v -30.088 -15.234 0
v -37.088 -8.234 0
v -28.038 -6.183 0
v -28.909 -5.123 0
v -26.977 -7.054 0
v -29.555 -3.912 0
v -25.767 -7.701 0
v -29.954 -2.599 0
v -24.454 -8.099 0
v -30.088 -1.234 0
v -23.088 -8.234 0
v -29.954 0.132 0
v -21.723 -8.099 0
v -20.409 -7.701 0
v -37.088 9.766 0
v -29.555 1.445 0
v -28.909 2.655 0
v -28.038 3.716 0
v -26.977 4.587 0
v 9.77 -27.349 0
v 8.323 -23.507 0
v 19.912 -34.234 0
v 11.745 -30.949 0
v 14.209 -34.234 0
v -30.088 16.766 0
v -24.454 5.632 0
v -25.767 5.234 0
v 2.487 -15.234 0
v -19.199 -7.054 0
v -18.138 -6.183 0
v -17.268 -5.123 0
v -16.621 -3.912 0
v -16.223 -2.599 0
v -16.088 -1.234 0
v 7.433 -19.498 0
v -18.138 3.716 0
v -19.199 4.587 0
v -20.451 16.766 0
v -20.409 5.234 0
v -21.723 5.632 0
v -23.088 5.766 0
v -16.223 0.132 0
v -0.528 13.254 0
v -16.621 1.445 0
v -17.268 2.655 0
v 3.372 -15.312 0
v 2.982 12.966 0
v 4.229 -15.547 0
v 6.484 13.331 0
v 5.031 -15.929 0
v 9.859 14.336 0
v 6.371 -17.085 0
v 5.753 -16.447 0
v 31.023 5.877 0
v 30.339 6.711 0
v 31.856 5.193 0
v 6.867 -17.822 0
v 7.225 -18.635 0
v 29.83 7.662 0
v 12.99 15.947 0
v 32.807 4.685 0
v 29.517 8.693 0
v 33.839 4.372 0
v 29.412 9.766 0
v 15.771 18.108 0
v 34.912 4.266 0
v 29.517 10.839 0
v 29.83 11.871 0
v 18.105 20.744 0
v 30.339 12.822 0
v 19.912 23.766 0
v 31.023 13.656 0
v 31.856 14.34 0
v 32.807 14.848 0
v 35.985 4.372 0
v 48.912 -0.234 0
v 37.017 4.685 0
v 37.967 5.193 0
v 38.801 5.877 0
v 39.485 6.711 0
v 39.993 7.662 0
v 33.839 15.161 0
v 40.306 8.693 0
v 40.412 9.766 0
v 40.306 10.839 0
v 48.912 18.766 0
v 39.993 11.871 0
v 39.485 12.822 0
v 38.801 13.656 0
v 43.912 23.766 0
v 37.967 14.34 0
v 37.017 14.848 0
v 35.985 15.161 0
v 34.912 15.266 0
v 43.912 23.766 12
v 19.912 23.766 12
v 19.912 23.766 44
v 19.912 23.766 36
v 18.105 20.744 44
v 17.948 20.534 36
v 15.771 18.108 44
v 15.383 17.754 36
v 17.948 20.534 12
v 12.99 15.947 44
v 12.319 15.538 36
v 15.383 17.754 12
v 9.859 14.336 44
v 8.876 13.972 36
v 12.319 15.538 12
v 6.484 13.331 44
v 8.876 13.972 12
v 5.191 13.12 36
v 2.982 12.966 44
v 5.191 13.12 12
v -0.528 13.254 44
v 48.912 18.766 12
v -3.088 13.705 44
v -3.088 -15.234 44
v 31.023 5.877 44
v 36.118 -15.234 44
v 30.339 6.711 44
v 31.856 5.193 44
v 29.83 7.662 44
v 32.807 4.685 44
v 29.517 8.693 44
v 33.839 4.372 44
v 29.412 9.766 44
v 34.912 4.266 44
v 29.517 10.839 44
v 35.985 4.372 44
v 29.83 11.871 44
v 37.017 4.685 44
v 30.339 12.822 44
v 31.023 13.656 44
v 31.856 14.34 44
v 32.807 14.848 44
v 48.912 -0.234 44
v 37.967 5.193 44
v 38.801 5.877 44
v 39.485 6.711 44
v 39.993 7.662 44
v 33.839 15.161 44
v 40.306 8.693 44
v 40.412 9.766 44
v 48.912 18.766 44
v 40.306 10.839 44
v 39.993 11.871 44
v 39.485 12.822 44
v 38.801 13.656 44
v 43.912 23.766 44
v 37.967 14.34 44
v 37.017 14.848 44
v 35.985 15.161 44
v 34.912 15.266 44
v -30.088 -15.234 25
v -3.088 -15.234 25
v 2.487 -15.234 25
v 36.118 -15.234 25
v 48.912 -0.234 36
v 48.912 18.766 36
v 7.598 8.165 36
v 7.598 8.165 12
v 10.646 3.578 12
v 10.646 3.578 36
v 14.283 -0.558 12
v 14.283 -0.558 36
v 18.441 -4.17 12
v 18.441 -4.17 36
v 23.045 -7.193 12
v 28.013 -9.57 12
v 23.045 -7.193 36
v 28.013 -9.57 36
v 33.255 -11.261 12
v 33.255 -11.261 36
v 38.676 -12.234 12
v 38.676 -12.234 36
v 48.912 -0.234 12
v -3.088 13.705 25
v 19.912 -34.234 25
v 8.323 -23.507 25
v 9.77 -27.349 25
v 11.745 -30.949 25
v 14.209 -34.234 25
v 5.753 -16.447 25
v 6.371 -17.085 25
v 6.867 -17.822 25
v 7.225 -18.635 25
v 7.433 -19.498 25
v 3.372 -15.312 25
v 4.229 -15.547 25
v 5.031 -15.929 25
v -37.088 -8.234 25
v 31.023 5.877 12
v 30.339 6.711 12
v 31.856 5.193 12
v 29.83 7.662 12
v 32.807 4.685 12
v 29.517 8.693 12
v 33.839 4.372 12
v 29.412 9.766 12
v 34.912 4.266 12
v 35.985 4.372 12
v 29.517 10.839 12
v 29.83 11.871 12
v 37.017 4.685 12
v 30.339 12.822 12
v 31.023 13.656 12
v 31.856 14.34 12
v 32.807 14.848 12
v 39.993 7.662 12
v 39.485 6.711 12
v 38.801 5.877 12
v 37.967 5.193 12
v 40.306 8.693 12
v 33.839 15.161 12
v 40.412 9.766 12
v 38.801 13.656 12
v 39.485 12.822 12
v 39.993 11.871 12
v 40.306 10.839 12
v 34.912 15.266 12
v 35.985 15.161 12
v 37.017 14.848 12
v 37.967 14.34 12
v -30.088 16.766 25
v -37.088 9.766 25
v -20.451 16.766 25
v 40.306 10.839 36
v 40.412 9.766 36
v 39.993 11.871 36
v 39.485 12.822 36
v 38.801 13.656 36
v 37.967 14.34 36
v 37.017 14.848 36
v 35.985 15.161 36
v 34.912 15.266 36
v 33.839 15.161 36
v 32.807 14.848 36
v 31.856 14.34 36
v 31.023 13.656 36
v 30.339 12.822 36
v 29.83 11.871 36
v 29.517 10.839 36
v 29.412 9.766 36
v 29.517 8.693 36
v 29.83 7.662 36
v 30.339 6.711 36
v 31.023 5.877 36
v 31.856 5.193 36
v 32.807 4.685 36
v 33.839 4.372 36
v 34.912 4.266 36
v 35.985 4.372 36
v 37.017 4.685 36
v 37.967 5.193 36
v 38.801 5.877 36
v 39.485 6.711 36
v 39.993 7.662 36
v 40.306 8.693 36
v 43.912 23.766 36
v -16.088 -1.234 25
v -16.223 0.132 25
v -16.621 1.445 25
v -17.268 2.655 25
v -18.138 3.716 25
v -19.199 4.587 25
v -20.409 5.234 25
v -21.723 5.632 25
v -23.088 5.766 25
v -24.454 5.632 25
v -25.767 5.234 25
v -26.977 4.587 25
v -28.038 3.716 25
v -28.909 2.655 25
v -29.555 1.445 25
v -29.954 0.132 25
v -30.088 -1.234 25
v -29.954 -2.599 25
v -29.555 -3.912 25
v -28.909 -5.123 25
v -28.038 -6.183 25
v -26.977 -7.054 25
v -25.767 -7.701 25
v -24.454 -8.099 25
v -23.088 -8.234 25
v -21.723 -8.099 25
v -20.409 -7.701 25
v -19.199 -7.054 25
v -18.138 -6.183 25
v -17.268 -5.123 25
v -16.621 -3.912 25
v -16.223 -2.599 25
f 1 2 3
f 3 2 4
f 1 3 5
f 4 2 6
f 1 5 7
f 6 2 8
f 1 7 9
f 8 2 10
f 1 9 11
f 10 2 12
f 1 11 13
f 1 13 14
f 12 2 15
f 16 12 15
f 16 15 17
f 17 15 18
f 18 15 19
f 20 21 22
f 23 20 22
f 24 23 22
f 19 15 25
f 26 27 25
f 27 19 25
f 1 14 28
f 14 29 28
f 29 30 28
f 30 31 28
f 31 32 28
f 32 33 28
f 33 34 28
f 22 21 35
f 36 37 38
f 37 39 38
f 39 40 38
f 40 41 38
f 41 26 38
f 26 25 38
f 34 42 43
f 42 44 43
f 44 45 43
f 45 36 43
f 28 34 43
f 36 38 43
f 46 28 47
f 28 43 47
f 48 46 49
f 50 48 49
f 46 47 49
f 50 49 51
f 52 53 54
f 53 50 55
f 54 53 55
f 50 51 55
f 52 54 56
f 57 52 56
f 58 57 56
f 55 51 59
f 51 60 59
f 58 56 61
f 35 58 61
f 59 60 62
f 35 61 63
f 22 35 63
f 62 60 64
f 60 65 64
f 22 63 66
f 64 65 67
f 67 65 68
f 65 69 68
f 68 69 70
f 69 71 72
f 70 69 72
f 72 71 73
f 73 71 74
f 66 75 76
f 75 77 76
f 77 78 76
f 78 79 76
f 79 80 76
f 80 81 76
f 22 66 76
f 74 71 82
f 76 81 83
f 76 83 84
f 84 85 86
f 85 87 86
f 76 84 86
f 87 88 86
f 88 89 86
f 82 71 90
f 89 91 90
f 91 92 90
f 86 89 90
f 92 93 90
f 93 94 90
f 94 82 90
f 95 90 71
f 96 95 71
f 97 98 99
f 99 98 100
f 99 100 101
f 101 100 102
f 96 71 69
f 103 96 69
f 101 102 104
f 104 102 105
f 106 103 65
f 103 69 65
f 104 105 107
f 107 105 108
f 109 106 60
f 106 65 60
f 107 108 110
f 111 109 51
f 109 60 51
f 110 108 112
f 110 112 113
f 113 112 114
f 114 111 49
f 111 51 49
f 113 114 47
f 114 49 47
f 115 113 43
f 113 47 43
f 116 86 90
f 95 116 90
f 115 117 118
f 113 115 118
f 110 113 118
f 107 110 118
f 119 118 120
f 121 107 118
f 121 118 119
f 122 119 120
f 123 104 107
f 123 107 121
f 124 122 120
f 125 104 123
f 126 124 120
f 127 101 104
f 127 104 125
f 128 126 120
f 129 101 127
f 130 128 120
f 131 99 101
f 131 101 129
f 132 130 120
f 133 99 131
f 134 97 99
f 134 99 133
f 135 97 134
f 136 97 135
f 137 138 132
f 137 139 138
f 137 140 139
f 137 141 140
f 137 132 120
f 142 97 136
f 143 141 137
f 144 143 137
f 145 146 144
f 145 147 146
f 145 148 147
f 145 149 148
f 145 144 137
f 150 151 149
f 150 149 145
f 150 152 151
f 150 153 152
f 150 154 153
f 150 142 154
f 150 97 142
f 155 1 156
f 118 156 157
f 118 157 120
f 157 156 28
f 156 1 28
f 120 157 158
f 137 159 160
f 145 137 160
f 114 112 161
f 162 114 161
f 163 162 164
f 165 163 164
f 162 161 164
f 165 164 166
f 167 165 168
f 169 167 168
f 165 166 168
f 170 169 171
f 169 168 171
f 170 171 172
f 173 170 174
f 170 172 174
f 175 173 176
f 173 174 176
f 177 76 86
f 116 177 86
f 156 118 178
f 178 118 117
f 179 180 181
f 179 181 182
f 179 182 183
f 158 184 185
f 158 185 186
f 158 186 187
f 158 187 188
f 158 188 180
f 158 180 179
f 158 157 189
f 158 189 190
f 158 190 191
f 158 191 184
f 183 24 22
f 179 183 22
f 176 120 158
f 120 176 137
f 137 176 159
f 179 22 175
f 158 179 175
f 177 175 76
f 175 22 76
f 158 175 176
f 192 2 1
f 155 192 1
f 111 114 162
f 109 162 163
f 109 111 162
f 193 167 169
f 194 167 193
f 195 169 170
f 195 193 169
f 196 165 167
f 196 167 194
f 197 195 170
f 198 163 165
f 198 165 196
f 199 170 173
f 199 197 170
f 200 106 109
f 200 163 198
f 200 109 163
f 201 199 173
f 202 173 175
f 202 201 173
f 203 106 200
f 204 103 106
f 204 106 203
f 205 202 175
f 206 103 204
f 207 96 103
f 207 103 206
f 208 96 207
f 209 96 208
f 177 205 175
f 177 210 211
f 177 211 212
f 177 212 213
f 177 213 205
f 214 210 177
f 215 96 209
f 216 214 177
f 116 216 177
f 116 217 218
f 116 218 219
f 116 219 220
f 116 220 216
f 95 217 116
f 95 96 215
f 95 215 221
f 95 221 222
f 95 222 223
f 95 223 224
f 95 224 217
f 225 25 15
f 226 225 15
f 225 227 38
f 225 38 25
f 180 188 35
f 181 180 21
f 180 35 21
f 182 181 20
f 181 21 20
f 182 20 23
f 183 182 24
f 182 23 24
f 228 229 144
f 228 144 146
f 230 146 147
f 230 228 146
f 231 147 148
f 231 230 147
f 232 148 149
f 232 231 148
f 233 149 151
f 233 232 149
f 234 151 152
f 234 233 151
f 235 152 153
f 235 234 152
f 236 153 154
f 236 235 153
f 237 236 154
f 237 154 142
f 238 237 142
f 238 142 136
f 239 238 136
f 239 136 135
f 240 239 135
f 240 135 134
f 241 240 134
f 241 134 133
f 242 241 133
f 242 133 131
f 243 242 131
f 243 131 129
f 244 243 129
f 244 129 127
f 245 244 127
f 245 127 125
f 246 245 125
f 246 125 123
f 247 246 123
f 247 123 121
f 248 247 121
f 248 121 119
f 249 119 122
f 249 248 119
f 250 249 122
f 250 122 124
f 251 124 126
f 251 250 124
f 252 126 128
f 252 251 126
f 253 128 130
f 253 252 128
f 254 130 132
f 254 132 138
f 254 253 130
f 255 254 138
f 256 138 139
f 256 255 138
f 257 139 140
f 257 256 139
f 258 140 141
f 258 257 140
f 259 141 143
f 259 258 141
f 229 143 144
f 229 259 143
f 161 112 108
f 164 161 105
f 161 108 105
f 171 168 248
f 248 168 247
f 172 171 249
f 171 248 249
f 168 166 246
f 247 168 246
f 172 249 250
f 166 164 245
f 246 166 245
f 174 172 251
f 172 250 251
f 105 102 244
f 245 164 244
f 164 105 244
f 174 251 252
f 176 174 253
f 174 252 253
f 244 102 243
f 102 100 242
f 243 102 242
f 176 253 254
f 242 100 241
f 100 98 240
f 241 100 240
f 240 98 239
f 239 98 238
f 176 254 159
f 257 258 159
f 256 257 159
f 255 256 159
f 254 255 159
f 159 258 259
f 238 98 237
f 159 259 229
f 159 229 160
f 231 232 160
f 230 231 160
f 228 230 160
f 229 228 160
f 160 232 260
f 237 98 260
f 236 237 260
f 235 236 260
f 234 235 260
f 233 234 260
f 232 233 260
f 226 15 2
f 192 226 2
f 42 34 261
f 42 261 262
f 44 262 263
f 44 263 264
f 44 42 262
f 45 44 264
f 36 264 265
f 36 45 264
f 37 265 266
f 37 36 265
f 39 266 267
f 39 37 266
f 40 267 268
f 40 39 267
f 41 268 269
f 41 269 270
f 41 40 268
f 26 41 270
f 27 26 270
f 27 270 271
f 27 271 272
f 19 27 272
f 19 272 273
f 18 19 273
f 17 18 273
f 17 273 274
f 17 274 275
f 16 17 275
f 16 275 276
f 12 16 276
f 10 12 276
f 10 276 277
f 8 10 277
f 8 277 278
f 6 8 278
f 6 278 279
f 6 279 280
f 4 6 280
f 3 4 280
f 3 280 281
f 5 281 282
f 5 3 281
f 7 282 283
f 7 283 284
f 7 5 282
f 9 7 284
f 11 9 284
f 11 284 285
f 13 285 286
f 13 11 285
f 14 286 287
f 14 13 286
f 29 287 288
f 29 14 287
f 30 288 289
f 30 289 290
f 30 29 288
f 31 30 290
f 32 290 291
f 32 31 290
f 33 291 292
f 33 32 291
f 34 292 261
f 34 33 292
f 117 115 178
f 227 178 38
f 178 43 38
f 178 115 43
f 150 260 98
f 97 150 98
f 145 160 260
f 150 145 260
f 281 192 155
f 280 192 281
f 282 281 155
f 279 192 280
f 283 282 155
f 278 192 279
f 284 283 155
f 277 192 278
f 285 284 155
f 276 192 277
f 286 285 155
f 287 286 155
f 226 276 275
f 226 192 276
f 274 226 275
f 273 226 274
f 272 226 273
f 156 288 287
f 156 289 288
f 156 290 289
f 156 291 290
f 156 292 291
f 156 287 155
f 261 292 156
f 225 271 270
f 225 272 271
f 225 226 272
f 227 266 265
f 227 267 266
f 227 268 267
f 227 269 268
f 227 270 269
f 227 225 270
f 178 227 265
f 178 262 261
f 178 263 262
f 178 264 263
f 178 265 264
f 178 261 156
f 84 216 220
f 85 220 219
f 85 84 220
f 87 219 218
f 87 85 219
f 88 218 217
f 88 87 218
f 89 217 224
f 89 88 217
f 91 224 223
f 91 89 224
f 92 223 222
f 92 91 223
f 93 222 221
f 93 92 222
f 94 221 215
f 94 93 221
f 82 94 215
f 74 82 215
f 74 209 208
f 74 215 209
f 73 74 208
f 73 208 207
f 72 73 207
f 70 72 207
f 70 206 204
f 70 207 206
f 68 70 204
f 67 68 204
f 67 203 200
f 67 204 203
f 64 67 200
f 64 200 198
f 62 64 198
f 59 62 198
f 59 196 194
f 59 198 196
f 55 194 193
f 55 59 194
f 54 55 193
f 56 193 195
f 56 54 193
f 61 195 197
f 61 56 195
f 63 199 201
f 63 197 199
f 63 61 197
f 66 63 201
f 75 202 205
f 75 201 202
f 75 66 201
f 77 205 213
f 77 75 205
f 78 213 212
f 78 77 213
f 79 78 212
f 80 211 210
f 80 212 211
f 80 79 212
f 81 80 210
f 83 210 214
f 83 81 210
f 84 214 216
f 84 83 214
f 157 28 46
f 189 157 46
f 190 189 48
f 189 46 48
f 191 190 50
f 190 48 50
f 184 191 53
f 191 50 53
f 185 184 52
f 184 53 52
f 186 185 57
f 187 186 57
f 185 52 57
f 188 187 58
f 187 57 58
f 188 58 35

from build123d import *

# Parameters (mm, degrees)
F0_R     = 7
F0_R_2   = 5.5
F1_DEPTH = 44
F2_R     = 7
F3_DEPTH = 19
F5_R     = 41
F6_DEPTH = 24
F8_DEPTH = 19


with BuildPart() as f1:
    # F0 (on Top) → F1 (new body)
    with BuildSketch(Plane.XY):
        with BuildLine():
            Line((-20.4506443609, 16.7664520695), (-30.0882231277, 16.7664520695))
            Line((-30.0882231277, 16.7664520695), (-37.0882231277, 9.7664520695))
            Line((-37.0882231277, 9.7664520695), (-37.0882231277, -8.2335479305))
            Line((-37.0882231277, -8.2335479305), (-30.0882231277, -15.2335479305))
            Line((-30.0882231277, -15.2335479305), (2.4873157836, -15.2335479305))
            ThreePointArc((2.4873157836, -15.2335479305), (5.7525515647, -16.4469616983), (7.432954525, -19.4982538128))
            ThreePointArc((7.432954525, -19.4982538128), (9.7697847282, -27.3492199915), (14.208756925, -34.2335479305))
            Line((14.208756925, -34.2335479305), (19.9117768723, -34.2335479305))
            Line((19.9117768723, -34.2335479305), (48.9117768723, -0.2335479305))
            Line((48.9117768723, -0.2335479305), (48.9117768723, 18.7664520695))
            Line((48.9117768723, 18.7664520695), (43.9117768723, 23.7664520695))
            Line((43.9117768723, 23.7664520695), (19.9117768723, 23.7664520695))
            ThreePointArc((19.9117768723, 23.7664520695), (11.4619798371, 15.0687874681), (-0.5277319739, 13.2535050814))
            Line((-0.5277319739, 13.2535050814), (-20.4506443609, 16.7664520695))
        make_face()
        with Locations((-23.0882231277, -1.2335479305)):
            Circle(F0_R, mode=Mode.SUBTRACT)
        with Locations((34.9117768723, 9.7664520695)):
            Circle(F0_R_2, mode=Mode.SUBTRACT)
    extrude(amount=F1_DEPTH)

    # F2 (on face) → F3 (cut)
    with BuildSketch(Plane.XY.offset(44)):
        Polygon((-30.0882231277, -15.2335479305), (-3.0882231277, -15.2335479305), (-3.0882231277, 13.7049887557), (-20.4506443609, 16.7664520695), (-30.0882231277, 16.7664520695), (-37.0882231277, 9.7664520695), (-37.0882231277, -8.2335479305), align=None)
        with Locations((-23.0882231277, -1.2335479305)):
            Circle(F2_R, mode=Mode.SUBTRACT)
    extrude(amount=-F3_DEPTH, mode=Mode.SUBTRACT)

    # F5 (on offset) → F6 (cut)
    with BuildSketch(Plane.XY.offset(36)):
        with Locations((43.189617951, 28.5173000447)):
            Circle(F5_R)
    extrude(amount=-F6_DEPTH, mode=Mode.SUBTRACT)

    # F7 (on face) → F8 (cut)
    with BuildSketch(Plane.XY.offset(44)):
        with BuildLine():
            Line((36.1176592252, -15.2335479305), (2.4873157836, -15.2335479305))
            ThreePointArc((2.4873157836, -15.2335479305), (5.7525515647, -16.4469616983), (7.432954525, -19.4982538128))
            ThreePointArc((7.432954525, -19.4982538128), (9.7697847282, -27.3492199915), (14.208756925, -34.2335479305))
            Line((14.208756925, -34.2335479305), (19.9117768723, -34.2335479305))
            Line((19.9117768723, -34.2335479305), (36.1176592252, -15.2335479305))
        make_face()
    extrude(amount=-F8_DEPTH, mode=Mode.SUBTRACT)


solid = f1.part
